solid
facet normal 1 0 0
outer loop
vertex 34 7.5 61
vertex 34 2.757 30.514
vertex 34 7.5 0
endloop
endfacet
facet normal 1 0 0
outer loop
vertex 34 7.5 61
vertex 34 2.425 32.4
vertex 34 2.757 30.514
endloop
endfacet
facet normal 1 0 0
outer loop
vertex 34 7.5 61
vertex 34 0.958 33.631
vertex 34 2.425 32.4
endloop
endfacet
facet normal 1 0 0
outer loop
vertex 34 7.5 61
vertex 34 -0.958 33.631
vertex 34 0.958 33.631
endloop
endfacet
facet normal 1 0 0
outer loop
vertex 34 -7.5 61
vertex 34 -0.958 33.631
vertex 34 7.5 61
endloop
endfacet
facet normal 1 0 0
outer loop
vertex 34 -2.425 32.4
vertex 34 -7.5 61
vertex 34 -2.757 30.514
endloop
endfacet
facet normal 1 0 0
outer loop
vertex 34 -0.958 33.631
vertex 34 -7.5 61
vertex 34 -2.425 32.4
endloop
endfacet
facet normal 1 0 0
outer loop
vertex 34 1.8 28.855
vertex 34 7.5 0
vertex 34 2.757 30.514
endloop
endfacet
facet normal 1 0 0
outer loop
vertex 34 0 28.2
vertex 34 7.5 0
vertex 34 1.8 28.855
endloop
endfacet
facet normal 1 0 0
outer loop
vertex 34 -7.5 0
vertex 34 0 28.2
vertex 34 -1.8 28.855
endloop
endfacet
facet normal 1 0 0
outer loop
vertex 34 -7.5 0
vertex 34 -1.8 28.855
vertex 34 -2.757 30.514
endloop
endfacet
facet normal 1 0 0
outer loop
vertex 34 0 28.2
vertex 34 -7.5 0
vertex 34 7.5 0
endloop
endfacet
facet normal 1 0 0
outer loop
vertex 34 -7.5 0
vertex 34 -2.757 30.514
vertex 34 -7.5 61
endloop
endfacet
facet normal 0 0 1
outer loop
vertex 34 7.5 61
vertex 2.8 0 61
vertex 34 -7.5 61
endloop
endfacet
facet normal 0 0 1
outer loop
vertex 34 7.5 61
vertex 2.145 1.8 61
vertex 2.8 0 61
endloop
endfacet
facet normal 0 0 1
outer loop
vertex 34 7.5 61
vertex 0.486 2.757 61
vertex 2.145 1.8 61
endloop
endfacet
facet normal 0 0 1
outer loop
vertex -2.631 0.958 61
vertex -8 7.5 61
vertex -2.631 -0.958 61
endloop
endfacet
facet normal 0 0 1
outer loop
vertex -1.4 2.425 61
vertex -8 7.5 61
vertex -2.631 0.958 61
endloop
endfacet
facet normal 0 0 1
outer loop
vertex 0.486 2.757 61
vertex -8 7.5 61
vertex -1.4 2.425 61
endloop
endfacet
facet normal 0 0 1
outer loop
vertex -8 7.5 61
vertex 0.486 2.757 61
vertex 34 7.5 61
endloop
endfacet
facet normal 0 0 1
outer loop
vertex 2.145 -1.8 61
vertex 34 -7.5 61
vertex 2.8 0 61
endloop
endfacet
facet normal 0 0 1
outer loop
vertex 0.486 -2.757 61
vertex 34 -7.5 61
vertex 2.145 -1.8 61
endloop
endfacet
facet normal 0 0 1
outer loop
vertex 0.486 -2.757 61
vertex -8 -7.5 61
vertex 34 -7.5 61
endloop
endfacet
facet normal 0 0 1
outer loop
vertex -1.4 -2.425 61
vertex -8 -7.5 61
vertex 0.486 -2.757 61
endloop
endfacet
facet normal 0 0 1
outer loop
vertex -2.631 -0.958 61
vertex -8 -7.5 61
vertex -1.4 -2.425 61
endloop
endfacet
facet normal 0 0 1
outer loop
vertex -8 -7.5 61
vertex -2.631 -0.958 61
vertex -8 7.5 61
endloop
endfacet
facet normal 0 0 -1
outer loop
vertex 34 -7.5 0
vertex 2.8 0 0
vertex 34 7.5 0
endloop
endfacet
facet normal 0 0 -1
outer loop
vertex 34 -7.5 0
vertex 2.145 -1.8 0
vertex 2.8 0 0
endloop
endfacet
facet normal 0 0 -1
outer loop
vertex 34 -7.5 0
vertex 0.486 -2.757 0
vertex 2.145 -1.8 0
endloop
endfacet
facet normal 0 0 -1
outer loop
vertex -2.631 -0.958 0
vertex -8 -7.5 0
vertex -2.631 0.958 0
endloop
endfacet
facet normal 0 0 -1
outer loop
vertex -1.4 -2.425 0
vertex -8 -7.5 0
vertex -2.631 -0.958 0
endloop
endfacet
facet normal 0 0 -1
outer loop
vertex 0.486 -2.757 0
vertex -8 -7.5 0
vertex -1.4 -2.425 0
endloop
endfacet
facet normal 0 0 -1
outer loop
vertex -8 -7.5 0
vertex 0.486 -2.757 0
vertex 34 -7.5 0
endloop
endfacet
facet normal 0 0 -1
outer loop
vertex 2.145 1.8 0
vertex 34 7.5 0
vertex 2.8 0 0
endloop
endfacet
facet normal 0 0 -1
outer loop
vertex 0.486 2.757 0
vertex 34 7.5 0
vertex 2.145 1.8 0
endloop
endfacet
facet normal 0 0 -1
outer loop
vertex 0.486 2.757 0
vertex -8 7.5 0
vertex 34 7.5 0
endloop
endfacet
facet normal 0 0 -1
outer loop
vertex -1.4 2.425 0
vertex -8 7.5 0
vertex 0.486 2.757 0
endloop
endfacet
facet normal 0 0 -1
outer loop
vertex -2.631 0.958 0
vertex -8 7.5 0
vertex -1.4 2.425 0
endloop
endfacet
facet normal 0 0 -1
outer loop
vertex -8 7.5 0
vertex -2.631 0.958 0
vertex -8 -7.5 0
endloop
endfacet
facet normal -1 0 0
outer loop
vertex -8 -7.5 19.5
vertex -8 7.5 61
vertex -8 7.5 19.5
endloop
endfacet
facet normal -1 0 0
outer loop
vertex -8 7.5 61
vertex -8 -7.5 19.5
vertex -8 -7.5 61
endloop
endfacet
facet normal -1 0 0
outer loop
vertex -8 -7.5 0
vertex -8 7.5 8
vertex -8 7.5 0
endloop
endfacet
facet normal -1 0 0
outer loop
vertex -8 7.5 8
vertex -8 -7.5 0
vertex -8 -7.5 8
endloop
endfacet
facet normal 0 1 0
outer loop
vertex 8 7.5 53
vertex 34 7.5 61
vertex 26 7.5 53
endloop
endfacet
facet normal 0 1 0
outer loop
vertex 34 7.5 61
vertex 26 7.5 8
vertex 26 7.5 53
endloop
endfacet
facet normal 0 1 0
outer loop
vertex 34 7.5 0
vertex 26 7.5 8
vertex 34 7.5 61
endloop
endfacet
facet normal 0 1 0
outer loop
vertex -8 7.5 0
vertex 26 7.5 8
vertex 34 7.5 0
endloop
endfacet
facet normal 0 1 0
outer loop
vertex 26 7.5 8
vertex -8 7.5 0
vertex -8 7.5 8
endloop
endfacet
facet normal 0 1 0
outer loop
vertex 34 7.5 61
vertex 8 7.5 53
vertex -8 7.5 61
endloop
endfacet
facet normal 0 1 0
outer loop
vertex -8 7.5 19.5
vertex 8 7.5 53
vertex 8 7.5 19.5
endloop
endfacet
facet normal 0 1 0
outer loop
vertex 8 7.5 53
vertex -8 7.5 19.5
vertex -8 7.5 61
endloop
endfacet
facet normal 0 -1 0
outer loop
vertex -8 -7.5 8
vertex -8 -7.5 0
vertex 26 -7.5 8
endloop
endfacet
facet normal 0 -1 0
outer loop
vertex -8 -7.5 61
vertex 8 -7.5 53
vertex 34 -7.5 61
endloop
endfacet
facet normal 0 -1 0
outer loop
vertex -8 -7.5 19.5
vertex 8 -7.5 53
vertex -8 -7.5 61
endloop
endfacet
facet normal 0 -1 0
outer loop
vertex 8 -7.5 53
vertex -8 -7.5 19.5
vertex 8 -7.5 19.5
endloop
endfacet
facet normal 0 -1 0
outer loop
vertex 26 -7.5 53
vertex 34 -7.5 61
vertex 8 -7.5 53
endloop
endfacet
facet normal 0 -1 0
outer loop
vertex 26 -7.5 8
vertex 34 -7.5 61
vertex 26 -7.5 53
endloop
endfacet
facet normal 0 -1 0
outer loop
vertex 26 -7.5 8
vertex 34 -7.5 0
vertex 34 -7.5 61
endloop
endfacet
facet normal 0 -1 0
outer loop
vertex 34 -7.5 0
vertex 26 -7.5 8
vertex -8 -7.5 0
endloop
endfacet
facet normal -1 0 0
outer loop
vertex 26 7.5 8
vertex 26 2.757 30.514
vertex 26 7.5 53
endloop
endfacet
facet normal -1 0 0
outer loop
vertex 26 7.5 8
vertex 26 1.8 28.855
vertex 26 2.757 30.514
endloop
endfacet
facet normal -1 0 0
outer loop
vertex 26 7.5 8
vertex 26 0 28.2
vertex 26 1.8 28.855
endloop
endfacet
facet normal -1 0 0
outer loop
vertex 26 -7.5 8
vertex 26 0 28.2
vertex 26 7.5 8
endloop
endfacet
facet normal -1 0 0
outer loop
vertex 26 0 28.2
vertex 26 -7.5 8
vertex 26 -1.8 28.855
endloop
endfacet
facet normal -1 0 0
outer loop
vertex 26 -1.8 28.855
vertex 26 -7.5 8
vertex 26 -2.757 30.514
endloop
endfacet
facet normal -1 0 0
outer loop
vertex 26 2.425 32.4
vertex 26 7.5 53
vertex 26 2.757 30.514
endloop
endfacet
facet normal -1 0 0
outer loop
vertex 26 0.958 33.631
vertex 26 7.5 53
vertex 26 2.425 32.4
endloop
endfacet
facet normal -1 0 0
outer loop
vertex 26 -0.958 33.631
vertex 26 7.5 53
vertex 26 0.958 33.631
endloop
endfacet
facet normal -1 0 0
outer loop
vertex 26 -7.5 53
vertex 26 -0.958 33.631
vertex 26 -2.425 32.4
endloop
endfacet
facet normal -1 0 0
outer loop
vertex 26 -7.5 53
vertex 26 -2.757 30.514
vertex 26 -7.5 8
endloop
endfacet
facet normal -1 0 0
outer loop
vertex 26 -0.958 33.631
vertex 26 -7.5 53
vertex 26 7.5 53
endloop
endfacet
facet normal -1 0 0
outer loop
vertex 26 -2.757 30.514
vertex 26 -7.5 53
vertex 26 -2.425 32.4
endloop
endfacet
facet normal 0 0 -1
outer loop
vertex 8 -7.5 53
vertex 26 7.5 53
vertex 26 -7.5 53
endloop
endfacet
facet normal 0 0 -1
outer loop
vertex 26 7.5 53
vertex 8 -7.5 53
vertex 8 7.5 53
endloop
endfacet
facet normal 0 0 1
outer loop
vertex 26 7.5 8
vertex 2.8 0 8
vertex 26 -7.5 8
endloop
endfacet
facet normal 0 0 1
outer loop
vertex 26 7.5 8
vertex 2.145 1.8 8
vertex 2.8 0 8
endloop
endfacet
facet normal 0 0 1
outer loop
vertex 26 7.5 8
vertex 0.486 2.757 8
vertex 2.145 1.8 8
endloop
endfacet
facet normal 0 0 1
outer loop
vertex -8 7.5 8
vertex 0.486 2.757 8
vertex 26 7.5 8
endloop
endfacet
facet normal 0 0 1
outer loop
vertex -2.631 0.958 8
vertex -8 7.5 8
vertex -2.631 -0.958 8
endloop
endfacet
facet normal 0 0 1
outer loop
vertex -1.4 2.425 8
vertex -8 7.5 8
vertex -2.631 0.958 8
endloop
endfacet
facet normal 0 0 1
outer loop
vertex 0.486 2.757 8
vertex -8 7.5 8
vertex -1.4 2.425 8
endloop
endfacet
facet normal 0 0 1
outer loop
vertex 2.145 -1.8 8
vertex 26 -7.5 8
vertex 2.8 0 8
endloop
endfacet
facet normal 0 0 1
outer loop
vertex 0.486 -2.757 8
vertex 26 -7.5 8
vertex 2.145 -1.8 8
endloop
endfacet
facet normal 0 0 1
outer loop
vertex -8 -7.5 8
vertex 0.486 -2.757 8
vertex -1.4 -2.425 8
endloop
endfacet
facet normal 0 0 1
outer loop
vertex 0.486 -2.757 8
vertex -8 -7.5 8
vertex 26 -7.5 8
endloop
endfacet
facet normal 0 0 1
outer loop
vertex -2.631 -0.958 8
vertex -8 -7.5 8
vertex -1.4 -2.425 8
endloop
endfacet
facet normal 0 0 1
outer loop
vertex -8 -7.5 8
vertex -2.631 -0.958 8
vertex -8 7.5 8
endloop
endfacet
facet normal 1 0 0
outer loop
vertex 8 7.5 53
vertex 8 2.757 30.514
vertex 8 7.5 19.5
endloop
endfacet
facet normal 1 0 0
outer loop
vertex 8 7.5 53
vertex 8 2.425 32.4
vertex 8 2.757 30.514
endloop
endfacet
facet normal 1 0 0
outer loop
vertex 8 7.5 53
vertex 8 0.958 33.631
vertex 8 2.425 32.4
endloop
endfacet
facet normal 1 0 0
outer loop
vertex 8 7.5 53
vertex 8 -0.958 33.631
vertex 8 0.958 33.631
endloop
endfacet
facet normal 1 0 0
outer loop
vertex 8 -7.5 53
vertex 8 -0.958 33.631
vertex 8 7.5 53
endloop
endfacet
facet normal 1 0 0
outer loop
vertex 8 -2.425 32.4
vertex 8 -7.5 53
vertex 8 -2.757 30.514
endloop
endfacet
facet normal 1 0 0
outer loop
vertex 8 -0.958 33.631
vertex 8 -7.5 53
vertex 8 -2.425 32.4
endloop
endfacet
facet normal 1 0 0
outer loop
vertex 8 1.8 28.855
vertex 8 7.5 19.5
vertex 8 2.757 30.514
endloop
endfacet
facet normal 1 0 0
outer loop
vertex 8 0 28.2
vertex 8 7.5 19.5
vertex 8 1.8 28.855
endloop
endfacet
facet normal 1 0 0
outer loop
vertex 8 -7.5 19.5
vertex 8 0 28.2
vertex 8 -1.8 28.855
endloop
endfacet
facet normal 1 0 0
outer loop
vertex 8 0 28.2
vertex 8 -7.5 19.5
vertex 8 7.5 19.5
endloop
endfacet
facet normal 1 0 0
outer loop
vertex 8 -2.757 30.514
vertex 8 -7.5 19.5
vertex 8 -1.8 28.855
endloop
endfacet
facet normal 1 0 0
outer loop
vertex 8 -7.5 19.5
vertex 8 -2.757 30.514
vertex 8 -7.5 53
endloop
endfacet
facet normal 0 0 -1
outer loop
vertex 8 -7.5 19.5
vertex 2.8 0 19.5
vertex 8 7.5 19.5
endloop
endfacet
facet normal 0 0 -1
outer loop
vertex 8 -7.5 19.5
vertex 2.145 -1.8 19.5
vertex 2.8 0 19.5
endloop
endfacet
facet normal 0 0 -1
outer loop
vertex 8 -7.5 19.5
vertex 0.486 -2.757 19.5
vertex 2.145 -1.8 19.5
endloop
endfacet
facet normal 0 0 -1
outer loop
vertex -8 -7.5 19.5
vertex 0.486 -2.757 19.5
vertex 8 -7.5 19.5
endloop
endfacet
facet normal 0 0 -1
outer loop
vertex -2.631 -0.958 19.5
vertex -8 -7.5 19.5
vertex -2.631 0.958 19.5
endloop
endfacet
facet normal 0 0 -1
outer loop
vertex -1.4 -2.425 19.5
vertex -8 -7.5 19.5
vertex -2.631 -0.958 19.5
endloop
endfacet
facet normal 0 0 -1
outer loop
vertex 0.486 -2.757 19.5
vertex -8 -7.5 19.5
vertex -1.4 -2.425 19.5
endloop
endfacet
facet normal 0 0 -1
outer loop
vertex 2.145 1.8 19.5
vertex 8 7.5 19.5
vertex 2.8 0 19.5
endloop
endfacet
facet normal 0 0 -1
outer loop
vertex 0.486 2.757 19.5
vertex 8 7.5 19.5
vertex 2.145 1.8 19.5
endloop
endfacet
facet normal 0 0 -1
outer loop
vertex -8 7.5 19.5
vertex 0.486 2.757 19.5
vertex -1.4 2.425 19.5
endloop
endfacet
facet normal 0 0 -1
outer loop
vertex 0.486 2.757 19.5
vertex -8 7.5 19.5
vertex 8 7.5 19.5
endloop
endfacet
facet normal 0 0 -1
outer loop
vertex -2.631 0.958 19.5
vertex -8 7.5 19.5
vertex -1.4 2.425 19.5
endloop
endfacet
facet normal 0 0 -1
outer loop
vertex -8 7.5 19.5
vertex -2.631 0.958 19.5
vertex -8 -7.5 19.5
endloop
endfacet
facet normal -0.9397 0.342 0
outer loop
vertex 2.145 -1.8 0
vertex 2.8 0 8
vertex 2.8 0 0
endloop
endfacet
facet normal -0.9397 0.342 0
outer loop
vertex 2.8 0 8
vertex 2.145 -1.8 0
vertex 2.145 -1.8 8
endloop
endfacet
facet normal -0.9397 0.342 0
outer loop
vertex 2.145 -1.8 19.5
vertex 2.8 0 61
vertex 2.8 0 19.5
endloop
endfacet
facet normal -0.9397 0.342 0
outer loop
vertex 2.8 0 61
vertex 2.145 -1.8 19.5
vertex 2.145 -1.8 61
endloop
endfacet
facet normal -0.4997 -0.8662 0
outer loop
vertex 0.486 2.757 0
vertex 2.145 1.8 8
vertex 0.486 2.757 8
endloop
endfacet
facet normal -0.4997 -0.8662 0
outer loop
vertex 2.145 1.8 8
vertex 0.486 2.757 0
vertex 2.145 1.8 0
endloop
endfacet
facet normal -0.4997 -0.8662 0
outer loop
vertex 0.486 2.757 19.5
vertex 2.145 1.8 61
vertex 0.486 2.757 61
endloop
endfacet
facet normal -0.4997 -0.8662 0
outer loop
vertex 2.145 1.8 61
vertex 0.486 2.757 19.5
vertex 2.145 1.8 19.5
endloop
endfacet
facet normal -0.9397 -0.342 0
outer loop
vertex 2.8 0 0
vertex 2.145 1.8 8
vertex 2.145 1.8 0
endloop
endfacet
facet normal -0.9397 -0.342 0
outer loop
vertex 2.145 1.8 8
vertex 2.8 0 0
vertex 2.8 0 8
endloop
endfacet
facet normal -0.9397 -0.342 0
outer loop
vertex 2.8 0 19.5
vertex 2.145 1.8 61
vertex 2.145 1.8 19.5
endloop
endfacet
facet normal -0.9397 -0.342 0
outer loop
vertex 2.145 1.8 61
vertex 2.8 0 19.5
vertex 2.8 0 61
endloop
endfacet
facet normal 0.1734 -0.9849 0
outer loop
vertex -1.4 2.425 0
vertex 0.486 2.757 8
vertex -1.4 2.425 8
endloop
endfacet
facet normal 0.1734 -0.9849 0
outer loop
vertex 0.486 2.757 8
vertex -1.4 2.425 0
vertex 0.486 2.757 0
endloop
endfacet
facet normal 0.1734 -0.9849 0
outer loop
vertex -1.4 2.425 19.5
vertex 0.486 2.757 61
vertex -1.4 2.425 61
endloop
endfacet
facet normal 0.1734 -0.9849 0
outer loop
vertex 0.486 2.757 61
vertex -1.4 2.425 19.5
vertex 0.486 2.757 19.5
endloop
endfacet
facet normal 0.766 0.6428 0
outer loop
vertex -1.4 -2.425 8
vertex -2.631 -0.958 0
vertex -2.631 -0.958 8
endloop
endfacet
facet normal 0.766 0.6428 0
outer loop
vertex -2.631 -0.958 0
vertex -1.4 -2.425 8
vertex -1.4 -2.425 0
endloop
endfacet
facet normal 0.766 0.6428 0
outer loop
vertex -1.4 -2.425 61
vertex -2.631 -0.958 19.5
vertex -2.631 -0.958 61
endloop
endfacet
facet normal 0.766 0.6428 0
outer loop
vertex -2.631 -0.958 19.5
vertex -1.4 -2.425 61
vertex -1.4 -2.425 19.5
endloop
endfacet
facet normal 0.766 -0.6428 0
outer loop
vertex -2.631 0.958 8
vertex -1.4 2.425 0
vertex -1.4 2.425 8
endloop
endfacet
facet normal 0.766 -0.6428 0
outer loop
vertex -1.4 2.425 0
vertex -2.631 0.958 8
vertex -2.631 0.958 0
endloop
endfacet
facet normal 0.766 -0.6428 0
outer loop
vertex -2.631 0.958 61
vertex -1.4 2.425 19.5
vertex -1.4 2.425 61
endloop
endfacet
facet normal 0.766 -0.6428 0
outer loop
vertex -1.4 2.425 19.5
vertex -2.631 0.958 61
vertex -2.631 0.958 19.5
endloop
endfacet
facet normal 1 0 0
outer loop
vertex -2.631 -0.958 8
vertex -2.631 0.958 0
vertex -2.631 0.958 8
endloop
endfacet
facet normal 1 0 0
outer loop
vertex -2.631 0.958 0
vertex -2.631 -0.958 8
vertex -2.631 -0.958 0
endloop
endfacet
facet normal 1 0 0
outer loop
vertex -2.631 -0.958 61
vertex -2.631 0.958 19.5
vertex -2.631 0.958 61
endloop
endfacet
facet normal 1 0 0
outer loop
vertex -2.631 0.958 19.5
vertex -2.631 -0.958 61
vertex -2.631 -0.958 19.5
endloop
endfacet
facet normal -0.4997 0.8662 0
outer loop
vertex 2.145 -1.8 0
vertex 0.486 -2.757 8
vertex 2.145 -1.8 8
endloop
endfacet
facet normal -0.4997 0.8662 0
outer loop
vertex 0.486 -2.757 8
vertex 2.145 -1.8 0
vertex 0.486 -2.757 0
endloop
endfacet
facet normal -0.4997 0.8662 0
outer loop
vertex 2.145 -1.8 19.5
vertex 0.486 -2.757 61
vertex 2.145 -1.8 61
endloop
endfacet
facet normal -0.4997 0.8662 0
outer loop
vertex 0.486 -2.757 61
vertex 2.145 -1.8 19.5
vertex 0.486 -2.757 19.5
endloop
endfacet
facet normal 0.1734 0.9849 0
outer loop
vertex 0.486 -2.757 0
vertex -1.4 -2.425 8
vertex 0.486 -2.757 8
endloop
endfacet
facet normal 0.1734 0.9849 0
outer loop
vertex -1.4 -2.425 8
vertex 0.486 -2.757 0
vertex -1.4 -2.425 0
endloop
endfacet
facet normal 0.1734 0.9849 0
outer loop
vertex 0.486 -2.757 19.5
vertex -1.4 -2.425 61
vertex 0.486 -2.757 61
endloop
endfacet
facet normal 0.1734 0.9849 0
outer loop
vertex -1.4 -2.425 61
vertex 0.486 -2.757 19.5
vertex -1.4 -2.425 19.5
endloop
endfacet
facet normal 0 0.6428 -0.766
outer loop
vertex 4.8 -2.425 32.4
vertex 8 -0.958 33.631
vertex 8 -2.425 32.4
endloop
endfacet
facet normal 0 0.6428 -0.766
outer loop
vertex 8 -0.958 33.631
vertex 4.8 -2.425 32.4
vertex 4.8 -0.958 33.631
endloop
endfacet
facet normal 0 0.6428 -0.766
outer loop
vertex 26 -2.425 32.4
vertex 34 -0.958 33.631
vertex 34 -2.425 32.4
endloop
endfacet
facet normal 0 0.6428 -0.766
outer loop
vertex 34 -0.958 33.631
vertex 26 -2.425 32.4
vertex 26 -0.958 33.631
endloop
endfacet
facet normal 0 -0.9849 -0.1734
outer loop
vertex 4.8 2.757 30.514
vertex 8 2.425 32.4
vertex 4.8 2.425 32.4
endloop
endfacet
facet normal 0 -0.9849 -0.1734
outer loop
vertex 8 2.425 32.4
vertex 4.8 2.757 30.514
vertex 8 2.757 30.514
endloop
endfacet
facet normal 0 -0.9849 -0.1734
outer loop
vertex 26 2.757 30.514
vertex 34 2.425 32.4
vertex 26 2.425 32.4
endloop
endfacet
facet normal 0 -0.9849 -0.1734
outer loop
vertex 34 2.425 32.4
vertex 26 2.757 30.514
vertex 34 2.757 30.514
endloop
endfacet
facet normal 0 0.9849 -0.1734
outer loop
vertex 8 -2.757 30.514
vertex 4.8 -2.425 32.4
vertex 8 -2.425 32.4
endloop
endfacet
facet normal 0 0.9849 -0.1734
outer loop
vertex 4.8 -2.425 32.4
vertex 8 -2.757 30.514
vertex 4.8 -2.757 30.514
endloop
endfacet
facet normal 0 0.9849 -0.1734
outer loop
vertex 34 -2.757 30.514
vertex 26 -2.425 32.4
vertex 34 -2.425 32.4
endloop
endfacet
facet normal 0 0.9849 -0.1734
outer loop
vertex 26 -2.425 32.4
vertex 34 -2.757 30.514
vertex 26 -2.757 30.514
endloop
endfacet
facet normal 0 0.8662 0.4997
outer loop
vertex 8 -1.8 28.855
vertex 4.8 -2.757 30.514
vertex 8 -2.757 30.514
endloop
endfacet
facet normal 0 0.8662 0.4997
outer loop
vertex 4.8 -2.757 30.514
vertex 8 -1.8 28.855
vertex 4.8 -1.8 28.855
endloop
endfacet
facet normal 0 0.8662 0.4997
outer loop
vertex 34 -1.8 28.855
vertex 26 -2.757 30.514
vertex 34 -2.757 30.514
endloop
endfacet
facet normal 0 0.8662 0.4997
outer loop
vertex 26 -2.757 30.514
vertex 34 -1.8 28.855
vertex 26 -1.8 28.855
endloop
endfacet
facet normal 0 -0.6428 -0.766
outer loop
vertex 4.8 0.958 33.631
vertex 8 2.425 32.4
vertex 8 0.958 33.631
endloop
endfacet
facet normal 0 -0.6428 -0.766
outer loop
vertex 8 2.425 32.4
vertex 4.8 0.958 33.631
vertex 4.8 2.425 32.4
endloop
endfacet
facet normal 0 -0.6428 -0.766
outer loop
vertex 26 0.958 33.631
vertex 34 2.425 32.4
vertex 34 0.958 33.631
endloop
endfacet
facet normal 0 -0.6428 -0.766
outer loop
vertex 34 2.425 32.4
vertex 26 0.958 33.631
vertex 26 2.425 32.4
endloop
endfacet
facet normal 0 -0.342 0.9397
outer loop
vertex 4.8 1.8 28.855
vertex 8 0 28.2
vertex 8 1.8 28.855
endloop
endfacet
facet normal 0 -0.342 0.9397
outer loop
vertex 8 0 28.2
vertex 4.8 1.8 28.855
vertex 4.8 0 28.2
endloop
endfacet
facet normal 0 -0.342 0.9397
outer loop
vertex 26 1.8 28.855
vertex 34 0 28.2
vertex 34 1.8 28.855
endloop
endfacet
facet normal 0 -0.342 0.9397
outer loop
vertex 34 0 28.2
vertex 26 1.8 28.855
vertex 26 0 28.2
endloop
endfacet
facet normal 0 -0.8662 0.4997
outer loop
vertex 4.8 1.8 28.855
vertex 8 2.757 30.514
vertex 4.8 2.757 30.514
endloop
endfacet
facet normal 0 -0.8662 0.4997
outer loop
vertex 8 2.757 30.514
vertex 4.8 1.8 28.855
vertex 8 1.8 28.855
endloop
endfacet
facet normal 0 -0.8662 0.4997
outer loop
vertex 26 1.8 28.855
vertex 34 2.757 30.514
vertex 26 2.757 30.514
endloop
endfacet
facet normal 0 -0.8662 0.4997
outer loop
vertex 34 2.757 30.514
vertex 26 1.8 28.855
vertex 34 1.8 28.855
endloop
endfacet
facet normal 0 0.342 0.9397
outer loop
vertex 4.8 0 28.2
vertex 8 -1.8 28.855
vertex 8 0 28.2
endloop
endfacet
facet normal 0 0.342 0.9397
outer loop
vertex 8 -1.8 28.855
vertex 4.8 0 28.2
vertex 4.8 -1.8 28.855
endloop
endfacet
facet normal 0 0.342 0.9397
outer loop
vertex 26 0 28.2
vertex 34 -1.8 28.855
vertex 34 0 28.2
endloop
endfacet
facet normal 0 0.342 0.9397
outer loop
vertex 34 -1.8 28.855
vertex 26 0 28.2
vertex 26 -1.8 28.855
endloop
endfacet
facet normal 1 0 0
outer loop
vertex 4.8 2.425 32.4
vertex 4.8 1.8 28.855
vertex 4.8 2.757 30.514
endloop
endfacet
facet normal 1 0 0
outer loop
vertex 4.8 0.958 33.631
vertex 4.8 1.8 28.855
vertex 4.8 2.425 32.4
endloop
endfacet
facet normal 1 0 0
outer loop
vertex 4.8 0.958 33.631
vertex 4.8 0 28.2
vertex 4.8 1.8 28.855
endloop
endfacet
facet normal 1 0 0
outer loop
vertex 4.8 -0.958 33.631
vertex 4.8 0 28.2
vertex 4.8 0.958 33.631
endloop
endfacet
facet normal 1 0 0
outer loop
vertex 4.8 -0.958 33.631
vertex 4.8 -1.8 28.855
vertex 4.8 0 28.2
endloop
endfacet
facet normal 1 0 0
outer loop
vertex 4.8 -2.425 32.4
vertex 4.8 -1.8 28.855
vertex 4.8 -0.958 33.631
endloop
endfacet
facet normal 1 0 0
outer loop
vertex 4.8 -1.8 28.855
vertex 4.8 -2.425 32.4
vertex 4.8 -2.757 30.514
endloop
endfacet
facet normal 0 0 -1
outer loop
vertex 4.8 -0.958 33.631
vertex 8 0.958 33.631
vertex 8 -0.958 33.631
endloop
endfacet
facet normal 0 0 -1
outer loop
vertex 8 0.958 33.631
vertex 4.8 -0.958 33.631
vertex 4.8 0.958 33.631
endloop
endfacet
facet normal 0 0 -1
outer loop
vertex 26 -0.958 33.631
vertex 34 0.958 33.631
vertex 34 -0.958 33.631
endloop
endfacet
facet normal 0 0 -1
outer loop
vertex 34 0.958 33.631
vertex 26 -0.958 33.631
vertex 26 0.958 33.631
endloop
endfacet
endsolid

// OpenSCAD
include <MCAD/boxes.scad>


out_depth = 15;

wall_depth = 16;

in_height = 45;
in_length = 26 - (wall_depth / 2);
in_depth = out_depth * 2;

out_length = in_length + wall_depth * 1.5;
out_height = in_height + wall_depth;

cutout_height = 11.5;
rod_hole_height = 23;
rod_radius = 2.8;

//motor_height = 24;

//rotate([90,0,0]) {
difference() {
                //rotate([90,0,0]) 
                //roundedBox([55, 20, 55], 5, true);     
        translate([-wall_depth / 2, -out_depth / 2, 0]) cube([out_length, out_depth, out_height], false);
        translate([wall_depth / 2, -in_depth / 2, (out_height - in_height) / 2]) 
                cube([in_length, in_depth, in_height], false);

        // bottom cutout
        translate([-in_length / 2, -in_depth / 2, wall_depth/2]) 
                cube([in_length, in_depth, cutout_height], false);

        // axle hole
        translate([0,0,40])
        #cylinder(h = 120, r = rod_radius, center = true, $fa=2);

        // 26mm from axle center to 

        // rod hole
        translate([wall_depth * .3, 0, wall_depth / 2 + rod_hole_height]) rotate([0, 90, 0])
                #cylinder(h = 50, r = rod_radius, center = false, $fa = 1);
        }
//}
